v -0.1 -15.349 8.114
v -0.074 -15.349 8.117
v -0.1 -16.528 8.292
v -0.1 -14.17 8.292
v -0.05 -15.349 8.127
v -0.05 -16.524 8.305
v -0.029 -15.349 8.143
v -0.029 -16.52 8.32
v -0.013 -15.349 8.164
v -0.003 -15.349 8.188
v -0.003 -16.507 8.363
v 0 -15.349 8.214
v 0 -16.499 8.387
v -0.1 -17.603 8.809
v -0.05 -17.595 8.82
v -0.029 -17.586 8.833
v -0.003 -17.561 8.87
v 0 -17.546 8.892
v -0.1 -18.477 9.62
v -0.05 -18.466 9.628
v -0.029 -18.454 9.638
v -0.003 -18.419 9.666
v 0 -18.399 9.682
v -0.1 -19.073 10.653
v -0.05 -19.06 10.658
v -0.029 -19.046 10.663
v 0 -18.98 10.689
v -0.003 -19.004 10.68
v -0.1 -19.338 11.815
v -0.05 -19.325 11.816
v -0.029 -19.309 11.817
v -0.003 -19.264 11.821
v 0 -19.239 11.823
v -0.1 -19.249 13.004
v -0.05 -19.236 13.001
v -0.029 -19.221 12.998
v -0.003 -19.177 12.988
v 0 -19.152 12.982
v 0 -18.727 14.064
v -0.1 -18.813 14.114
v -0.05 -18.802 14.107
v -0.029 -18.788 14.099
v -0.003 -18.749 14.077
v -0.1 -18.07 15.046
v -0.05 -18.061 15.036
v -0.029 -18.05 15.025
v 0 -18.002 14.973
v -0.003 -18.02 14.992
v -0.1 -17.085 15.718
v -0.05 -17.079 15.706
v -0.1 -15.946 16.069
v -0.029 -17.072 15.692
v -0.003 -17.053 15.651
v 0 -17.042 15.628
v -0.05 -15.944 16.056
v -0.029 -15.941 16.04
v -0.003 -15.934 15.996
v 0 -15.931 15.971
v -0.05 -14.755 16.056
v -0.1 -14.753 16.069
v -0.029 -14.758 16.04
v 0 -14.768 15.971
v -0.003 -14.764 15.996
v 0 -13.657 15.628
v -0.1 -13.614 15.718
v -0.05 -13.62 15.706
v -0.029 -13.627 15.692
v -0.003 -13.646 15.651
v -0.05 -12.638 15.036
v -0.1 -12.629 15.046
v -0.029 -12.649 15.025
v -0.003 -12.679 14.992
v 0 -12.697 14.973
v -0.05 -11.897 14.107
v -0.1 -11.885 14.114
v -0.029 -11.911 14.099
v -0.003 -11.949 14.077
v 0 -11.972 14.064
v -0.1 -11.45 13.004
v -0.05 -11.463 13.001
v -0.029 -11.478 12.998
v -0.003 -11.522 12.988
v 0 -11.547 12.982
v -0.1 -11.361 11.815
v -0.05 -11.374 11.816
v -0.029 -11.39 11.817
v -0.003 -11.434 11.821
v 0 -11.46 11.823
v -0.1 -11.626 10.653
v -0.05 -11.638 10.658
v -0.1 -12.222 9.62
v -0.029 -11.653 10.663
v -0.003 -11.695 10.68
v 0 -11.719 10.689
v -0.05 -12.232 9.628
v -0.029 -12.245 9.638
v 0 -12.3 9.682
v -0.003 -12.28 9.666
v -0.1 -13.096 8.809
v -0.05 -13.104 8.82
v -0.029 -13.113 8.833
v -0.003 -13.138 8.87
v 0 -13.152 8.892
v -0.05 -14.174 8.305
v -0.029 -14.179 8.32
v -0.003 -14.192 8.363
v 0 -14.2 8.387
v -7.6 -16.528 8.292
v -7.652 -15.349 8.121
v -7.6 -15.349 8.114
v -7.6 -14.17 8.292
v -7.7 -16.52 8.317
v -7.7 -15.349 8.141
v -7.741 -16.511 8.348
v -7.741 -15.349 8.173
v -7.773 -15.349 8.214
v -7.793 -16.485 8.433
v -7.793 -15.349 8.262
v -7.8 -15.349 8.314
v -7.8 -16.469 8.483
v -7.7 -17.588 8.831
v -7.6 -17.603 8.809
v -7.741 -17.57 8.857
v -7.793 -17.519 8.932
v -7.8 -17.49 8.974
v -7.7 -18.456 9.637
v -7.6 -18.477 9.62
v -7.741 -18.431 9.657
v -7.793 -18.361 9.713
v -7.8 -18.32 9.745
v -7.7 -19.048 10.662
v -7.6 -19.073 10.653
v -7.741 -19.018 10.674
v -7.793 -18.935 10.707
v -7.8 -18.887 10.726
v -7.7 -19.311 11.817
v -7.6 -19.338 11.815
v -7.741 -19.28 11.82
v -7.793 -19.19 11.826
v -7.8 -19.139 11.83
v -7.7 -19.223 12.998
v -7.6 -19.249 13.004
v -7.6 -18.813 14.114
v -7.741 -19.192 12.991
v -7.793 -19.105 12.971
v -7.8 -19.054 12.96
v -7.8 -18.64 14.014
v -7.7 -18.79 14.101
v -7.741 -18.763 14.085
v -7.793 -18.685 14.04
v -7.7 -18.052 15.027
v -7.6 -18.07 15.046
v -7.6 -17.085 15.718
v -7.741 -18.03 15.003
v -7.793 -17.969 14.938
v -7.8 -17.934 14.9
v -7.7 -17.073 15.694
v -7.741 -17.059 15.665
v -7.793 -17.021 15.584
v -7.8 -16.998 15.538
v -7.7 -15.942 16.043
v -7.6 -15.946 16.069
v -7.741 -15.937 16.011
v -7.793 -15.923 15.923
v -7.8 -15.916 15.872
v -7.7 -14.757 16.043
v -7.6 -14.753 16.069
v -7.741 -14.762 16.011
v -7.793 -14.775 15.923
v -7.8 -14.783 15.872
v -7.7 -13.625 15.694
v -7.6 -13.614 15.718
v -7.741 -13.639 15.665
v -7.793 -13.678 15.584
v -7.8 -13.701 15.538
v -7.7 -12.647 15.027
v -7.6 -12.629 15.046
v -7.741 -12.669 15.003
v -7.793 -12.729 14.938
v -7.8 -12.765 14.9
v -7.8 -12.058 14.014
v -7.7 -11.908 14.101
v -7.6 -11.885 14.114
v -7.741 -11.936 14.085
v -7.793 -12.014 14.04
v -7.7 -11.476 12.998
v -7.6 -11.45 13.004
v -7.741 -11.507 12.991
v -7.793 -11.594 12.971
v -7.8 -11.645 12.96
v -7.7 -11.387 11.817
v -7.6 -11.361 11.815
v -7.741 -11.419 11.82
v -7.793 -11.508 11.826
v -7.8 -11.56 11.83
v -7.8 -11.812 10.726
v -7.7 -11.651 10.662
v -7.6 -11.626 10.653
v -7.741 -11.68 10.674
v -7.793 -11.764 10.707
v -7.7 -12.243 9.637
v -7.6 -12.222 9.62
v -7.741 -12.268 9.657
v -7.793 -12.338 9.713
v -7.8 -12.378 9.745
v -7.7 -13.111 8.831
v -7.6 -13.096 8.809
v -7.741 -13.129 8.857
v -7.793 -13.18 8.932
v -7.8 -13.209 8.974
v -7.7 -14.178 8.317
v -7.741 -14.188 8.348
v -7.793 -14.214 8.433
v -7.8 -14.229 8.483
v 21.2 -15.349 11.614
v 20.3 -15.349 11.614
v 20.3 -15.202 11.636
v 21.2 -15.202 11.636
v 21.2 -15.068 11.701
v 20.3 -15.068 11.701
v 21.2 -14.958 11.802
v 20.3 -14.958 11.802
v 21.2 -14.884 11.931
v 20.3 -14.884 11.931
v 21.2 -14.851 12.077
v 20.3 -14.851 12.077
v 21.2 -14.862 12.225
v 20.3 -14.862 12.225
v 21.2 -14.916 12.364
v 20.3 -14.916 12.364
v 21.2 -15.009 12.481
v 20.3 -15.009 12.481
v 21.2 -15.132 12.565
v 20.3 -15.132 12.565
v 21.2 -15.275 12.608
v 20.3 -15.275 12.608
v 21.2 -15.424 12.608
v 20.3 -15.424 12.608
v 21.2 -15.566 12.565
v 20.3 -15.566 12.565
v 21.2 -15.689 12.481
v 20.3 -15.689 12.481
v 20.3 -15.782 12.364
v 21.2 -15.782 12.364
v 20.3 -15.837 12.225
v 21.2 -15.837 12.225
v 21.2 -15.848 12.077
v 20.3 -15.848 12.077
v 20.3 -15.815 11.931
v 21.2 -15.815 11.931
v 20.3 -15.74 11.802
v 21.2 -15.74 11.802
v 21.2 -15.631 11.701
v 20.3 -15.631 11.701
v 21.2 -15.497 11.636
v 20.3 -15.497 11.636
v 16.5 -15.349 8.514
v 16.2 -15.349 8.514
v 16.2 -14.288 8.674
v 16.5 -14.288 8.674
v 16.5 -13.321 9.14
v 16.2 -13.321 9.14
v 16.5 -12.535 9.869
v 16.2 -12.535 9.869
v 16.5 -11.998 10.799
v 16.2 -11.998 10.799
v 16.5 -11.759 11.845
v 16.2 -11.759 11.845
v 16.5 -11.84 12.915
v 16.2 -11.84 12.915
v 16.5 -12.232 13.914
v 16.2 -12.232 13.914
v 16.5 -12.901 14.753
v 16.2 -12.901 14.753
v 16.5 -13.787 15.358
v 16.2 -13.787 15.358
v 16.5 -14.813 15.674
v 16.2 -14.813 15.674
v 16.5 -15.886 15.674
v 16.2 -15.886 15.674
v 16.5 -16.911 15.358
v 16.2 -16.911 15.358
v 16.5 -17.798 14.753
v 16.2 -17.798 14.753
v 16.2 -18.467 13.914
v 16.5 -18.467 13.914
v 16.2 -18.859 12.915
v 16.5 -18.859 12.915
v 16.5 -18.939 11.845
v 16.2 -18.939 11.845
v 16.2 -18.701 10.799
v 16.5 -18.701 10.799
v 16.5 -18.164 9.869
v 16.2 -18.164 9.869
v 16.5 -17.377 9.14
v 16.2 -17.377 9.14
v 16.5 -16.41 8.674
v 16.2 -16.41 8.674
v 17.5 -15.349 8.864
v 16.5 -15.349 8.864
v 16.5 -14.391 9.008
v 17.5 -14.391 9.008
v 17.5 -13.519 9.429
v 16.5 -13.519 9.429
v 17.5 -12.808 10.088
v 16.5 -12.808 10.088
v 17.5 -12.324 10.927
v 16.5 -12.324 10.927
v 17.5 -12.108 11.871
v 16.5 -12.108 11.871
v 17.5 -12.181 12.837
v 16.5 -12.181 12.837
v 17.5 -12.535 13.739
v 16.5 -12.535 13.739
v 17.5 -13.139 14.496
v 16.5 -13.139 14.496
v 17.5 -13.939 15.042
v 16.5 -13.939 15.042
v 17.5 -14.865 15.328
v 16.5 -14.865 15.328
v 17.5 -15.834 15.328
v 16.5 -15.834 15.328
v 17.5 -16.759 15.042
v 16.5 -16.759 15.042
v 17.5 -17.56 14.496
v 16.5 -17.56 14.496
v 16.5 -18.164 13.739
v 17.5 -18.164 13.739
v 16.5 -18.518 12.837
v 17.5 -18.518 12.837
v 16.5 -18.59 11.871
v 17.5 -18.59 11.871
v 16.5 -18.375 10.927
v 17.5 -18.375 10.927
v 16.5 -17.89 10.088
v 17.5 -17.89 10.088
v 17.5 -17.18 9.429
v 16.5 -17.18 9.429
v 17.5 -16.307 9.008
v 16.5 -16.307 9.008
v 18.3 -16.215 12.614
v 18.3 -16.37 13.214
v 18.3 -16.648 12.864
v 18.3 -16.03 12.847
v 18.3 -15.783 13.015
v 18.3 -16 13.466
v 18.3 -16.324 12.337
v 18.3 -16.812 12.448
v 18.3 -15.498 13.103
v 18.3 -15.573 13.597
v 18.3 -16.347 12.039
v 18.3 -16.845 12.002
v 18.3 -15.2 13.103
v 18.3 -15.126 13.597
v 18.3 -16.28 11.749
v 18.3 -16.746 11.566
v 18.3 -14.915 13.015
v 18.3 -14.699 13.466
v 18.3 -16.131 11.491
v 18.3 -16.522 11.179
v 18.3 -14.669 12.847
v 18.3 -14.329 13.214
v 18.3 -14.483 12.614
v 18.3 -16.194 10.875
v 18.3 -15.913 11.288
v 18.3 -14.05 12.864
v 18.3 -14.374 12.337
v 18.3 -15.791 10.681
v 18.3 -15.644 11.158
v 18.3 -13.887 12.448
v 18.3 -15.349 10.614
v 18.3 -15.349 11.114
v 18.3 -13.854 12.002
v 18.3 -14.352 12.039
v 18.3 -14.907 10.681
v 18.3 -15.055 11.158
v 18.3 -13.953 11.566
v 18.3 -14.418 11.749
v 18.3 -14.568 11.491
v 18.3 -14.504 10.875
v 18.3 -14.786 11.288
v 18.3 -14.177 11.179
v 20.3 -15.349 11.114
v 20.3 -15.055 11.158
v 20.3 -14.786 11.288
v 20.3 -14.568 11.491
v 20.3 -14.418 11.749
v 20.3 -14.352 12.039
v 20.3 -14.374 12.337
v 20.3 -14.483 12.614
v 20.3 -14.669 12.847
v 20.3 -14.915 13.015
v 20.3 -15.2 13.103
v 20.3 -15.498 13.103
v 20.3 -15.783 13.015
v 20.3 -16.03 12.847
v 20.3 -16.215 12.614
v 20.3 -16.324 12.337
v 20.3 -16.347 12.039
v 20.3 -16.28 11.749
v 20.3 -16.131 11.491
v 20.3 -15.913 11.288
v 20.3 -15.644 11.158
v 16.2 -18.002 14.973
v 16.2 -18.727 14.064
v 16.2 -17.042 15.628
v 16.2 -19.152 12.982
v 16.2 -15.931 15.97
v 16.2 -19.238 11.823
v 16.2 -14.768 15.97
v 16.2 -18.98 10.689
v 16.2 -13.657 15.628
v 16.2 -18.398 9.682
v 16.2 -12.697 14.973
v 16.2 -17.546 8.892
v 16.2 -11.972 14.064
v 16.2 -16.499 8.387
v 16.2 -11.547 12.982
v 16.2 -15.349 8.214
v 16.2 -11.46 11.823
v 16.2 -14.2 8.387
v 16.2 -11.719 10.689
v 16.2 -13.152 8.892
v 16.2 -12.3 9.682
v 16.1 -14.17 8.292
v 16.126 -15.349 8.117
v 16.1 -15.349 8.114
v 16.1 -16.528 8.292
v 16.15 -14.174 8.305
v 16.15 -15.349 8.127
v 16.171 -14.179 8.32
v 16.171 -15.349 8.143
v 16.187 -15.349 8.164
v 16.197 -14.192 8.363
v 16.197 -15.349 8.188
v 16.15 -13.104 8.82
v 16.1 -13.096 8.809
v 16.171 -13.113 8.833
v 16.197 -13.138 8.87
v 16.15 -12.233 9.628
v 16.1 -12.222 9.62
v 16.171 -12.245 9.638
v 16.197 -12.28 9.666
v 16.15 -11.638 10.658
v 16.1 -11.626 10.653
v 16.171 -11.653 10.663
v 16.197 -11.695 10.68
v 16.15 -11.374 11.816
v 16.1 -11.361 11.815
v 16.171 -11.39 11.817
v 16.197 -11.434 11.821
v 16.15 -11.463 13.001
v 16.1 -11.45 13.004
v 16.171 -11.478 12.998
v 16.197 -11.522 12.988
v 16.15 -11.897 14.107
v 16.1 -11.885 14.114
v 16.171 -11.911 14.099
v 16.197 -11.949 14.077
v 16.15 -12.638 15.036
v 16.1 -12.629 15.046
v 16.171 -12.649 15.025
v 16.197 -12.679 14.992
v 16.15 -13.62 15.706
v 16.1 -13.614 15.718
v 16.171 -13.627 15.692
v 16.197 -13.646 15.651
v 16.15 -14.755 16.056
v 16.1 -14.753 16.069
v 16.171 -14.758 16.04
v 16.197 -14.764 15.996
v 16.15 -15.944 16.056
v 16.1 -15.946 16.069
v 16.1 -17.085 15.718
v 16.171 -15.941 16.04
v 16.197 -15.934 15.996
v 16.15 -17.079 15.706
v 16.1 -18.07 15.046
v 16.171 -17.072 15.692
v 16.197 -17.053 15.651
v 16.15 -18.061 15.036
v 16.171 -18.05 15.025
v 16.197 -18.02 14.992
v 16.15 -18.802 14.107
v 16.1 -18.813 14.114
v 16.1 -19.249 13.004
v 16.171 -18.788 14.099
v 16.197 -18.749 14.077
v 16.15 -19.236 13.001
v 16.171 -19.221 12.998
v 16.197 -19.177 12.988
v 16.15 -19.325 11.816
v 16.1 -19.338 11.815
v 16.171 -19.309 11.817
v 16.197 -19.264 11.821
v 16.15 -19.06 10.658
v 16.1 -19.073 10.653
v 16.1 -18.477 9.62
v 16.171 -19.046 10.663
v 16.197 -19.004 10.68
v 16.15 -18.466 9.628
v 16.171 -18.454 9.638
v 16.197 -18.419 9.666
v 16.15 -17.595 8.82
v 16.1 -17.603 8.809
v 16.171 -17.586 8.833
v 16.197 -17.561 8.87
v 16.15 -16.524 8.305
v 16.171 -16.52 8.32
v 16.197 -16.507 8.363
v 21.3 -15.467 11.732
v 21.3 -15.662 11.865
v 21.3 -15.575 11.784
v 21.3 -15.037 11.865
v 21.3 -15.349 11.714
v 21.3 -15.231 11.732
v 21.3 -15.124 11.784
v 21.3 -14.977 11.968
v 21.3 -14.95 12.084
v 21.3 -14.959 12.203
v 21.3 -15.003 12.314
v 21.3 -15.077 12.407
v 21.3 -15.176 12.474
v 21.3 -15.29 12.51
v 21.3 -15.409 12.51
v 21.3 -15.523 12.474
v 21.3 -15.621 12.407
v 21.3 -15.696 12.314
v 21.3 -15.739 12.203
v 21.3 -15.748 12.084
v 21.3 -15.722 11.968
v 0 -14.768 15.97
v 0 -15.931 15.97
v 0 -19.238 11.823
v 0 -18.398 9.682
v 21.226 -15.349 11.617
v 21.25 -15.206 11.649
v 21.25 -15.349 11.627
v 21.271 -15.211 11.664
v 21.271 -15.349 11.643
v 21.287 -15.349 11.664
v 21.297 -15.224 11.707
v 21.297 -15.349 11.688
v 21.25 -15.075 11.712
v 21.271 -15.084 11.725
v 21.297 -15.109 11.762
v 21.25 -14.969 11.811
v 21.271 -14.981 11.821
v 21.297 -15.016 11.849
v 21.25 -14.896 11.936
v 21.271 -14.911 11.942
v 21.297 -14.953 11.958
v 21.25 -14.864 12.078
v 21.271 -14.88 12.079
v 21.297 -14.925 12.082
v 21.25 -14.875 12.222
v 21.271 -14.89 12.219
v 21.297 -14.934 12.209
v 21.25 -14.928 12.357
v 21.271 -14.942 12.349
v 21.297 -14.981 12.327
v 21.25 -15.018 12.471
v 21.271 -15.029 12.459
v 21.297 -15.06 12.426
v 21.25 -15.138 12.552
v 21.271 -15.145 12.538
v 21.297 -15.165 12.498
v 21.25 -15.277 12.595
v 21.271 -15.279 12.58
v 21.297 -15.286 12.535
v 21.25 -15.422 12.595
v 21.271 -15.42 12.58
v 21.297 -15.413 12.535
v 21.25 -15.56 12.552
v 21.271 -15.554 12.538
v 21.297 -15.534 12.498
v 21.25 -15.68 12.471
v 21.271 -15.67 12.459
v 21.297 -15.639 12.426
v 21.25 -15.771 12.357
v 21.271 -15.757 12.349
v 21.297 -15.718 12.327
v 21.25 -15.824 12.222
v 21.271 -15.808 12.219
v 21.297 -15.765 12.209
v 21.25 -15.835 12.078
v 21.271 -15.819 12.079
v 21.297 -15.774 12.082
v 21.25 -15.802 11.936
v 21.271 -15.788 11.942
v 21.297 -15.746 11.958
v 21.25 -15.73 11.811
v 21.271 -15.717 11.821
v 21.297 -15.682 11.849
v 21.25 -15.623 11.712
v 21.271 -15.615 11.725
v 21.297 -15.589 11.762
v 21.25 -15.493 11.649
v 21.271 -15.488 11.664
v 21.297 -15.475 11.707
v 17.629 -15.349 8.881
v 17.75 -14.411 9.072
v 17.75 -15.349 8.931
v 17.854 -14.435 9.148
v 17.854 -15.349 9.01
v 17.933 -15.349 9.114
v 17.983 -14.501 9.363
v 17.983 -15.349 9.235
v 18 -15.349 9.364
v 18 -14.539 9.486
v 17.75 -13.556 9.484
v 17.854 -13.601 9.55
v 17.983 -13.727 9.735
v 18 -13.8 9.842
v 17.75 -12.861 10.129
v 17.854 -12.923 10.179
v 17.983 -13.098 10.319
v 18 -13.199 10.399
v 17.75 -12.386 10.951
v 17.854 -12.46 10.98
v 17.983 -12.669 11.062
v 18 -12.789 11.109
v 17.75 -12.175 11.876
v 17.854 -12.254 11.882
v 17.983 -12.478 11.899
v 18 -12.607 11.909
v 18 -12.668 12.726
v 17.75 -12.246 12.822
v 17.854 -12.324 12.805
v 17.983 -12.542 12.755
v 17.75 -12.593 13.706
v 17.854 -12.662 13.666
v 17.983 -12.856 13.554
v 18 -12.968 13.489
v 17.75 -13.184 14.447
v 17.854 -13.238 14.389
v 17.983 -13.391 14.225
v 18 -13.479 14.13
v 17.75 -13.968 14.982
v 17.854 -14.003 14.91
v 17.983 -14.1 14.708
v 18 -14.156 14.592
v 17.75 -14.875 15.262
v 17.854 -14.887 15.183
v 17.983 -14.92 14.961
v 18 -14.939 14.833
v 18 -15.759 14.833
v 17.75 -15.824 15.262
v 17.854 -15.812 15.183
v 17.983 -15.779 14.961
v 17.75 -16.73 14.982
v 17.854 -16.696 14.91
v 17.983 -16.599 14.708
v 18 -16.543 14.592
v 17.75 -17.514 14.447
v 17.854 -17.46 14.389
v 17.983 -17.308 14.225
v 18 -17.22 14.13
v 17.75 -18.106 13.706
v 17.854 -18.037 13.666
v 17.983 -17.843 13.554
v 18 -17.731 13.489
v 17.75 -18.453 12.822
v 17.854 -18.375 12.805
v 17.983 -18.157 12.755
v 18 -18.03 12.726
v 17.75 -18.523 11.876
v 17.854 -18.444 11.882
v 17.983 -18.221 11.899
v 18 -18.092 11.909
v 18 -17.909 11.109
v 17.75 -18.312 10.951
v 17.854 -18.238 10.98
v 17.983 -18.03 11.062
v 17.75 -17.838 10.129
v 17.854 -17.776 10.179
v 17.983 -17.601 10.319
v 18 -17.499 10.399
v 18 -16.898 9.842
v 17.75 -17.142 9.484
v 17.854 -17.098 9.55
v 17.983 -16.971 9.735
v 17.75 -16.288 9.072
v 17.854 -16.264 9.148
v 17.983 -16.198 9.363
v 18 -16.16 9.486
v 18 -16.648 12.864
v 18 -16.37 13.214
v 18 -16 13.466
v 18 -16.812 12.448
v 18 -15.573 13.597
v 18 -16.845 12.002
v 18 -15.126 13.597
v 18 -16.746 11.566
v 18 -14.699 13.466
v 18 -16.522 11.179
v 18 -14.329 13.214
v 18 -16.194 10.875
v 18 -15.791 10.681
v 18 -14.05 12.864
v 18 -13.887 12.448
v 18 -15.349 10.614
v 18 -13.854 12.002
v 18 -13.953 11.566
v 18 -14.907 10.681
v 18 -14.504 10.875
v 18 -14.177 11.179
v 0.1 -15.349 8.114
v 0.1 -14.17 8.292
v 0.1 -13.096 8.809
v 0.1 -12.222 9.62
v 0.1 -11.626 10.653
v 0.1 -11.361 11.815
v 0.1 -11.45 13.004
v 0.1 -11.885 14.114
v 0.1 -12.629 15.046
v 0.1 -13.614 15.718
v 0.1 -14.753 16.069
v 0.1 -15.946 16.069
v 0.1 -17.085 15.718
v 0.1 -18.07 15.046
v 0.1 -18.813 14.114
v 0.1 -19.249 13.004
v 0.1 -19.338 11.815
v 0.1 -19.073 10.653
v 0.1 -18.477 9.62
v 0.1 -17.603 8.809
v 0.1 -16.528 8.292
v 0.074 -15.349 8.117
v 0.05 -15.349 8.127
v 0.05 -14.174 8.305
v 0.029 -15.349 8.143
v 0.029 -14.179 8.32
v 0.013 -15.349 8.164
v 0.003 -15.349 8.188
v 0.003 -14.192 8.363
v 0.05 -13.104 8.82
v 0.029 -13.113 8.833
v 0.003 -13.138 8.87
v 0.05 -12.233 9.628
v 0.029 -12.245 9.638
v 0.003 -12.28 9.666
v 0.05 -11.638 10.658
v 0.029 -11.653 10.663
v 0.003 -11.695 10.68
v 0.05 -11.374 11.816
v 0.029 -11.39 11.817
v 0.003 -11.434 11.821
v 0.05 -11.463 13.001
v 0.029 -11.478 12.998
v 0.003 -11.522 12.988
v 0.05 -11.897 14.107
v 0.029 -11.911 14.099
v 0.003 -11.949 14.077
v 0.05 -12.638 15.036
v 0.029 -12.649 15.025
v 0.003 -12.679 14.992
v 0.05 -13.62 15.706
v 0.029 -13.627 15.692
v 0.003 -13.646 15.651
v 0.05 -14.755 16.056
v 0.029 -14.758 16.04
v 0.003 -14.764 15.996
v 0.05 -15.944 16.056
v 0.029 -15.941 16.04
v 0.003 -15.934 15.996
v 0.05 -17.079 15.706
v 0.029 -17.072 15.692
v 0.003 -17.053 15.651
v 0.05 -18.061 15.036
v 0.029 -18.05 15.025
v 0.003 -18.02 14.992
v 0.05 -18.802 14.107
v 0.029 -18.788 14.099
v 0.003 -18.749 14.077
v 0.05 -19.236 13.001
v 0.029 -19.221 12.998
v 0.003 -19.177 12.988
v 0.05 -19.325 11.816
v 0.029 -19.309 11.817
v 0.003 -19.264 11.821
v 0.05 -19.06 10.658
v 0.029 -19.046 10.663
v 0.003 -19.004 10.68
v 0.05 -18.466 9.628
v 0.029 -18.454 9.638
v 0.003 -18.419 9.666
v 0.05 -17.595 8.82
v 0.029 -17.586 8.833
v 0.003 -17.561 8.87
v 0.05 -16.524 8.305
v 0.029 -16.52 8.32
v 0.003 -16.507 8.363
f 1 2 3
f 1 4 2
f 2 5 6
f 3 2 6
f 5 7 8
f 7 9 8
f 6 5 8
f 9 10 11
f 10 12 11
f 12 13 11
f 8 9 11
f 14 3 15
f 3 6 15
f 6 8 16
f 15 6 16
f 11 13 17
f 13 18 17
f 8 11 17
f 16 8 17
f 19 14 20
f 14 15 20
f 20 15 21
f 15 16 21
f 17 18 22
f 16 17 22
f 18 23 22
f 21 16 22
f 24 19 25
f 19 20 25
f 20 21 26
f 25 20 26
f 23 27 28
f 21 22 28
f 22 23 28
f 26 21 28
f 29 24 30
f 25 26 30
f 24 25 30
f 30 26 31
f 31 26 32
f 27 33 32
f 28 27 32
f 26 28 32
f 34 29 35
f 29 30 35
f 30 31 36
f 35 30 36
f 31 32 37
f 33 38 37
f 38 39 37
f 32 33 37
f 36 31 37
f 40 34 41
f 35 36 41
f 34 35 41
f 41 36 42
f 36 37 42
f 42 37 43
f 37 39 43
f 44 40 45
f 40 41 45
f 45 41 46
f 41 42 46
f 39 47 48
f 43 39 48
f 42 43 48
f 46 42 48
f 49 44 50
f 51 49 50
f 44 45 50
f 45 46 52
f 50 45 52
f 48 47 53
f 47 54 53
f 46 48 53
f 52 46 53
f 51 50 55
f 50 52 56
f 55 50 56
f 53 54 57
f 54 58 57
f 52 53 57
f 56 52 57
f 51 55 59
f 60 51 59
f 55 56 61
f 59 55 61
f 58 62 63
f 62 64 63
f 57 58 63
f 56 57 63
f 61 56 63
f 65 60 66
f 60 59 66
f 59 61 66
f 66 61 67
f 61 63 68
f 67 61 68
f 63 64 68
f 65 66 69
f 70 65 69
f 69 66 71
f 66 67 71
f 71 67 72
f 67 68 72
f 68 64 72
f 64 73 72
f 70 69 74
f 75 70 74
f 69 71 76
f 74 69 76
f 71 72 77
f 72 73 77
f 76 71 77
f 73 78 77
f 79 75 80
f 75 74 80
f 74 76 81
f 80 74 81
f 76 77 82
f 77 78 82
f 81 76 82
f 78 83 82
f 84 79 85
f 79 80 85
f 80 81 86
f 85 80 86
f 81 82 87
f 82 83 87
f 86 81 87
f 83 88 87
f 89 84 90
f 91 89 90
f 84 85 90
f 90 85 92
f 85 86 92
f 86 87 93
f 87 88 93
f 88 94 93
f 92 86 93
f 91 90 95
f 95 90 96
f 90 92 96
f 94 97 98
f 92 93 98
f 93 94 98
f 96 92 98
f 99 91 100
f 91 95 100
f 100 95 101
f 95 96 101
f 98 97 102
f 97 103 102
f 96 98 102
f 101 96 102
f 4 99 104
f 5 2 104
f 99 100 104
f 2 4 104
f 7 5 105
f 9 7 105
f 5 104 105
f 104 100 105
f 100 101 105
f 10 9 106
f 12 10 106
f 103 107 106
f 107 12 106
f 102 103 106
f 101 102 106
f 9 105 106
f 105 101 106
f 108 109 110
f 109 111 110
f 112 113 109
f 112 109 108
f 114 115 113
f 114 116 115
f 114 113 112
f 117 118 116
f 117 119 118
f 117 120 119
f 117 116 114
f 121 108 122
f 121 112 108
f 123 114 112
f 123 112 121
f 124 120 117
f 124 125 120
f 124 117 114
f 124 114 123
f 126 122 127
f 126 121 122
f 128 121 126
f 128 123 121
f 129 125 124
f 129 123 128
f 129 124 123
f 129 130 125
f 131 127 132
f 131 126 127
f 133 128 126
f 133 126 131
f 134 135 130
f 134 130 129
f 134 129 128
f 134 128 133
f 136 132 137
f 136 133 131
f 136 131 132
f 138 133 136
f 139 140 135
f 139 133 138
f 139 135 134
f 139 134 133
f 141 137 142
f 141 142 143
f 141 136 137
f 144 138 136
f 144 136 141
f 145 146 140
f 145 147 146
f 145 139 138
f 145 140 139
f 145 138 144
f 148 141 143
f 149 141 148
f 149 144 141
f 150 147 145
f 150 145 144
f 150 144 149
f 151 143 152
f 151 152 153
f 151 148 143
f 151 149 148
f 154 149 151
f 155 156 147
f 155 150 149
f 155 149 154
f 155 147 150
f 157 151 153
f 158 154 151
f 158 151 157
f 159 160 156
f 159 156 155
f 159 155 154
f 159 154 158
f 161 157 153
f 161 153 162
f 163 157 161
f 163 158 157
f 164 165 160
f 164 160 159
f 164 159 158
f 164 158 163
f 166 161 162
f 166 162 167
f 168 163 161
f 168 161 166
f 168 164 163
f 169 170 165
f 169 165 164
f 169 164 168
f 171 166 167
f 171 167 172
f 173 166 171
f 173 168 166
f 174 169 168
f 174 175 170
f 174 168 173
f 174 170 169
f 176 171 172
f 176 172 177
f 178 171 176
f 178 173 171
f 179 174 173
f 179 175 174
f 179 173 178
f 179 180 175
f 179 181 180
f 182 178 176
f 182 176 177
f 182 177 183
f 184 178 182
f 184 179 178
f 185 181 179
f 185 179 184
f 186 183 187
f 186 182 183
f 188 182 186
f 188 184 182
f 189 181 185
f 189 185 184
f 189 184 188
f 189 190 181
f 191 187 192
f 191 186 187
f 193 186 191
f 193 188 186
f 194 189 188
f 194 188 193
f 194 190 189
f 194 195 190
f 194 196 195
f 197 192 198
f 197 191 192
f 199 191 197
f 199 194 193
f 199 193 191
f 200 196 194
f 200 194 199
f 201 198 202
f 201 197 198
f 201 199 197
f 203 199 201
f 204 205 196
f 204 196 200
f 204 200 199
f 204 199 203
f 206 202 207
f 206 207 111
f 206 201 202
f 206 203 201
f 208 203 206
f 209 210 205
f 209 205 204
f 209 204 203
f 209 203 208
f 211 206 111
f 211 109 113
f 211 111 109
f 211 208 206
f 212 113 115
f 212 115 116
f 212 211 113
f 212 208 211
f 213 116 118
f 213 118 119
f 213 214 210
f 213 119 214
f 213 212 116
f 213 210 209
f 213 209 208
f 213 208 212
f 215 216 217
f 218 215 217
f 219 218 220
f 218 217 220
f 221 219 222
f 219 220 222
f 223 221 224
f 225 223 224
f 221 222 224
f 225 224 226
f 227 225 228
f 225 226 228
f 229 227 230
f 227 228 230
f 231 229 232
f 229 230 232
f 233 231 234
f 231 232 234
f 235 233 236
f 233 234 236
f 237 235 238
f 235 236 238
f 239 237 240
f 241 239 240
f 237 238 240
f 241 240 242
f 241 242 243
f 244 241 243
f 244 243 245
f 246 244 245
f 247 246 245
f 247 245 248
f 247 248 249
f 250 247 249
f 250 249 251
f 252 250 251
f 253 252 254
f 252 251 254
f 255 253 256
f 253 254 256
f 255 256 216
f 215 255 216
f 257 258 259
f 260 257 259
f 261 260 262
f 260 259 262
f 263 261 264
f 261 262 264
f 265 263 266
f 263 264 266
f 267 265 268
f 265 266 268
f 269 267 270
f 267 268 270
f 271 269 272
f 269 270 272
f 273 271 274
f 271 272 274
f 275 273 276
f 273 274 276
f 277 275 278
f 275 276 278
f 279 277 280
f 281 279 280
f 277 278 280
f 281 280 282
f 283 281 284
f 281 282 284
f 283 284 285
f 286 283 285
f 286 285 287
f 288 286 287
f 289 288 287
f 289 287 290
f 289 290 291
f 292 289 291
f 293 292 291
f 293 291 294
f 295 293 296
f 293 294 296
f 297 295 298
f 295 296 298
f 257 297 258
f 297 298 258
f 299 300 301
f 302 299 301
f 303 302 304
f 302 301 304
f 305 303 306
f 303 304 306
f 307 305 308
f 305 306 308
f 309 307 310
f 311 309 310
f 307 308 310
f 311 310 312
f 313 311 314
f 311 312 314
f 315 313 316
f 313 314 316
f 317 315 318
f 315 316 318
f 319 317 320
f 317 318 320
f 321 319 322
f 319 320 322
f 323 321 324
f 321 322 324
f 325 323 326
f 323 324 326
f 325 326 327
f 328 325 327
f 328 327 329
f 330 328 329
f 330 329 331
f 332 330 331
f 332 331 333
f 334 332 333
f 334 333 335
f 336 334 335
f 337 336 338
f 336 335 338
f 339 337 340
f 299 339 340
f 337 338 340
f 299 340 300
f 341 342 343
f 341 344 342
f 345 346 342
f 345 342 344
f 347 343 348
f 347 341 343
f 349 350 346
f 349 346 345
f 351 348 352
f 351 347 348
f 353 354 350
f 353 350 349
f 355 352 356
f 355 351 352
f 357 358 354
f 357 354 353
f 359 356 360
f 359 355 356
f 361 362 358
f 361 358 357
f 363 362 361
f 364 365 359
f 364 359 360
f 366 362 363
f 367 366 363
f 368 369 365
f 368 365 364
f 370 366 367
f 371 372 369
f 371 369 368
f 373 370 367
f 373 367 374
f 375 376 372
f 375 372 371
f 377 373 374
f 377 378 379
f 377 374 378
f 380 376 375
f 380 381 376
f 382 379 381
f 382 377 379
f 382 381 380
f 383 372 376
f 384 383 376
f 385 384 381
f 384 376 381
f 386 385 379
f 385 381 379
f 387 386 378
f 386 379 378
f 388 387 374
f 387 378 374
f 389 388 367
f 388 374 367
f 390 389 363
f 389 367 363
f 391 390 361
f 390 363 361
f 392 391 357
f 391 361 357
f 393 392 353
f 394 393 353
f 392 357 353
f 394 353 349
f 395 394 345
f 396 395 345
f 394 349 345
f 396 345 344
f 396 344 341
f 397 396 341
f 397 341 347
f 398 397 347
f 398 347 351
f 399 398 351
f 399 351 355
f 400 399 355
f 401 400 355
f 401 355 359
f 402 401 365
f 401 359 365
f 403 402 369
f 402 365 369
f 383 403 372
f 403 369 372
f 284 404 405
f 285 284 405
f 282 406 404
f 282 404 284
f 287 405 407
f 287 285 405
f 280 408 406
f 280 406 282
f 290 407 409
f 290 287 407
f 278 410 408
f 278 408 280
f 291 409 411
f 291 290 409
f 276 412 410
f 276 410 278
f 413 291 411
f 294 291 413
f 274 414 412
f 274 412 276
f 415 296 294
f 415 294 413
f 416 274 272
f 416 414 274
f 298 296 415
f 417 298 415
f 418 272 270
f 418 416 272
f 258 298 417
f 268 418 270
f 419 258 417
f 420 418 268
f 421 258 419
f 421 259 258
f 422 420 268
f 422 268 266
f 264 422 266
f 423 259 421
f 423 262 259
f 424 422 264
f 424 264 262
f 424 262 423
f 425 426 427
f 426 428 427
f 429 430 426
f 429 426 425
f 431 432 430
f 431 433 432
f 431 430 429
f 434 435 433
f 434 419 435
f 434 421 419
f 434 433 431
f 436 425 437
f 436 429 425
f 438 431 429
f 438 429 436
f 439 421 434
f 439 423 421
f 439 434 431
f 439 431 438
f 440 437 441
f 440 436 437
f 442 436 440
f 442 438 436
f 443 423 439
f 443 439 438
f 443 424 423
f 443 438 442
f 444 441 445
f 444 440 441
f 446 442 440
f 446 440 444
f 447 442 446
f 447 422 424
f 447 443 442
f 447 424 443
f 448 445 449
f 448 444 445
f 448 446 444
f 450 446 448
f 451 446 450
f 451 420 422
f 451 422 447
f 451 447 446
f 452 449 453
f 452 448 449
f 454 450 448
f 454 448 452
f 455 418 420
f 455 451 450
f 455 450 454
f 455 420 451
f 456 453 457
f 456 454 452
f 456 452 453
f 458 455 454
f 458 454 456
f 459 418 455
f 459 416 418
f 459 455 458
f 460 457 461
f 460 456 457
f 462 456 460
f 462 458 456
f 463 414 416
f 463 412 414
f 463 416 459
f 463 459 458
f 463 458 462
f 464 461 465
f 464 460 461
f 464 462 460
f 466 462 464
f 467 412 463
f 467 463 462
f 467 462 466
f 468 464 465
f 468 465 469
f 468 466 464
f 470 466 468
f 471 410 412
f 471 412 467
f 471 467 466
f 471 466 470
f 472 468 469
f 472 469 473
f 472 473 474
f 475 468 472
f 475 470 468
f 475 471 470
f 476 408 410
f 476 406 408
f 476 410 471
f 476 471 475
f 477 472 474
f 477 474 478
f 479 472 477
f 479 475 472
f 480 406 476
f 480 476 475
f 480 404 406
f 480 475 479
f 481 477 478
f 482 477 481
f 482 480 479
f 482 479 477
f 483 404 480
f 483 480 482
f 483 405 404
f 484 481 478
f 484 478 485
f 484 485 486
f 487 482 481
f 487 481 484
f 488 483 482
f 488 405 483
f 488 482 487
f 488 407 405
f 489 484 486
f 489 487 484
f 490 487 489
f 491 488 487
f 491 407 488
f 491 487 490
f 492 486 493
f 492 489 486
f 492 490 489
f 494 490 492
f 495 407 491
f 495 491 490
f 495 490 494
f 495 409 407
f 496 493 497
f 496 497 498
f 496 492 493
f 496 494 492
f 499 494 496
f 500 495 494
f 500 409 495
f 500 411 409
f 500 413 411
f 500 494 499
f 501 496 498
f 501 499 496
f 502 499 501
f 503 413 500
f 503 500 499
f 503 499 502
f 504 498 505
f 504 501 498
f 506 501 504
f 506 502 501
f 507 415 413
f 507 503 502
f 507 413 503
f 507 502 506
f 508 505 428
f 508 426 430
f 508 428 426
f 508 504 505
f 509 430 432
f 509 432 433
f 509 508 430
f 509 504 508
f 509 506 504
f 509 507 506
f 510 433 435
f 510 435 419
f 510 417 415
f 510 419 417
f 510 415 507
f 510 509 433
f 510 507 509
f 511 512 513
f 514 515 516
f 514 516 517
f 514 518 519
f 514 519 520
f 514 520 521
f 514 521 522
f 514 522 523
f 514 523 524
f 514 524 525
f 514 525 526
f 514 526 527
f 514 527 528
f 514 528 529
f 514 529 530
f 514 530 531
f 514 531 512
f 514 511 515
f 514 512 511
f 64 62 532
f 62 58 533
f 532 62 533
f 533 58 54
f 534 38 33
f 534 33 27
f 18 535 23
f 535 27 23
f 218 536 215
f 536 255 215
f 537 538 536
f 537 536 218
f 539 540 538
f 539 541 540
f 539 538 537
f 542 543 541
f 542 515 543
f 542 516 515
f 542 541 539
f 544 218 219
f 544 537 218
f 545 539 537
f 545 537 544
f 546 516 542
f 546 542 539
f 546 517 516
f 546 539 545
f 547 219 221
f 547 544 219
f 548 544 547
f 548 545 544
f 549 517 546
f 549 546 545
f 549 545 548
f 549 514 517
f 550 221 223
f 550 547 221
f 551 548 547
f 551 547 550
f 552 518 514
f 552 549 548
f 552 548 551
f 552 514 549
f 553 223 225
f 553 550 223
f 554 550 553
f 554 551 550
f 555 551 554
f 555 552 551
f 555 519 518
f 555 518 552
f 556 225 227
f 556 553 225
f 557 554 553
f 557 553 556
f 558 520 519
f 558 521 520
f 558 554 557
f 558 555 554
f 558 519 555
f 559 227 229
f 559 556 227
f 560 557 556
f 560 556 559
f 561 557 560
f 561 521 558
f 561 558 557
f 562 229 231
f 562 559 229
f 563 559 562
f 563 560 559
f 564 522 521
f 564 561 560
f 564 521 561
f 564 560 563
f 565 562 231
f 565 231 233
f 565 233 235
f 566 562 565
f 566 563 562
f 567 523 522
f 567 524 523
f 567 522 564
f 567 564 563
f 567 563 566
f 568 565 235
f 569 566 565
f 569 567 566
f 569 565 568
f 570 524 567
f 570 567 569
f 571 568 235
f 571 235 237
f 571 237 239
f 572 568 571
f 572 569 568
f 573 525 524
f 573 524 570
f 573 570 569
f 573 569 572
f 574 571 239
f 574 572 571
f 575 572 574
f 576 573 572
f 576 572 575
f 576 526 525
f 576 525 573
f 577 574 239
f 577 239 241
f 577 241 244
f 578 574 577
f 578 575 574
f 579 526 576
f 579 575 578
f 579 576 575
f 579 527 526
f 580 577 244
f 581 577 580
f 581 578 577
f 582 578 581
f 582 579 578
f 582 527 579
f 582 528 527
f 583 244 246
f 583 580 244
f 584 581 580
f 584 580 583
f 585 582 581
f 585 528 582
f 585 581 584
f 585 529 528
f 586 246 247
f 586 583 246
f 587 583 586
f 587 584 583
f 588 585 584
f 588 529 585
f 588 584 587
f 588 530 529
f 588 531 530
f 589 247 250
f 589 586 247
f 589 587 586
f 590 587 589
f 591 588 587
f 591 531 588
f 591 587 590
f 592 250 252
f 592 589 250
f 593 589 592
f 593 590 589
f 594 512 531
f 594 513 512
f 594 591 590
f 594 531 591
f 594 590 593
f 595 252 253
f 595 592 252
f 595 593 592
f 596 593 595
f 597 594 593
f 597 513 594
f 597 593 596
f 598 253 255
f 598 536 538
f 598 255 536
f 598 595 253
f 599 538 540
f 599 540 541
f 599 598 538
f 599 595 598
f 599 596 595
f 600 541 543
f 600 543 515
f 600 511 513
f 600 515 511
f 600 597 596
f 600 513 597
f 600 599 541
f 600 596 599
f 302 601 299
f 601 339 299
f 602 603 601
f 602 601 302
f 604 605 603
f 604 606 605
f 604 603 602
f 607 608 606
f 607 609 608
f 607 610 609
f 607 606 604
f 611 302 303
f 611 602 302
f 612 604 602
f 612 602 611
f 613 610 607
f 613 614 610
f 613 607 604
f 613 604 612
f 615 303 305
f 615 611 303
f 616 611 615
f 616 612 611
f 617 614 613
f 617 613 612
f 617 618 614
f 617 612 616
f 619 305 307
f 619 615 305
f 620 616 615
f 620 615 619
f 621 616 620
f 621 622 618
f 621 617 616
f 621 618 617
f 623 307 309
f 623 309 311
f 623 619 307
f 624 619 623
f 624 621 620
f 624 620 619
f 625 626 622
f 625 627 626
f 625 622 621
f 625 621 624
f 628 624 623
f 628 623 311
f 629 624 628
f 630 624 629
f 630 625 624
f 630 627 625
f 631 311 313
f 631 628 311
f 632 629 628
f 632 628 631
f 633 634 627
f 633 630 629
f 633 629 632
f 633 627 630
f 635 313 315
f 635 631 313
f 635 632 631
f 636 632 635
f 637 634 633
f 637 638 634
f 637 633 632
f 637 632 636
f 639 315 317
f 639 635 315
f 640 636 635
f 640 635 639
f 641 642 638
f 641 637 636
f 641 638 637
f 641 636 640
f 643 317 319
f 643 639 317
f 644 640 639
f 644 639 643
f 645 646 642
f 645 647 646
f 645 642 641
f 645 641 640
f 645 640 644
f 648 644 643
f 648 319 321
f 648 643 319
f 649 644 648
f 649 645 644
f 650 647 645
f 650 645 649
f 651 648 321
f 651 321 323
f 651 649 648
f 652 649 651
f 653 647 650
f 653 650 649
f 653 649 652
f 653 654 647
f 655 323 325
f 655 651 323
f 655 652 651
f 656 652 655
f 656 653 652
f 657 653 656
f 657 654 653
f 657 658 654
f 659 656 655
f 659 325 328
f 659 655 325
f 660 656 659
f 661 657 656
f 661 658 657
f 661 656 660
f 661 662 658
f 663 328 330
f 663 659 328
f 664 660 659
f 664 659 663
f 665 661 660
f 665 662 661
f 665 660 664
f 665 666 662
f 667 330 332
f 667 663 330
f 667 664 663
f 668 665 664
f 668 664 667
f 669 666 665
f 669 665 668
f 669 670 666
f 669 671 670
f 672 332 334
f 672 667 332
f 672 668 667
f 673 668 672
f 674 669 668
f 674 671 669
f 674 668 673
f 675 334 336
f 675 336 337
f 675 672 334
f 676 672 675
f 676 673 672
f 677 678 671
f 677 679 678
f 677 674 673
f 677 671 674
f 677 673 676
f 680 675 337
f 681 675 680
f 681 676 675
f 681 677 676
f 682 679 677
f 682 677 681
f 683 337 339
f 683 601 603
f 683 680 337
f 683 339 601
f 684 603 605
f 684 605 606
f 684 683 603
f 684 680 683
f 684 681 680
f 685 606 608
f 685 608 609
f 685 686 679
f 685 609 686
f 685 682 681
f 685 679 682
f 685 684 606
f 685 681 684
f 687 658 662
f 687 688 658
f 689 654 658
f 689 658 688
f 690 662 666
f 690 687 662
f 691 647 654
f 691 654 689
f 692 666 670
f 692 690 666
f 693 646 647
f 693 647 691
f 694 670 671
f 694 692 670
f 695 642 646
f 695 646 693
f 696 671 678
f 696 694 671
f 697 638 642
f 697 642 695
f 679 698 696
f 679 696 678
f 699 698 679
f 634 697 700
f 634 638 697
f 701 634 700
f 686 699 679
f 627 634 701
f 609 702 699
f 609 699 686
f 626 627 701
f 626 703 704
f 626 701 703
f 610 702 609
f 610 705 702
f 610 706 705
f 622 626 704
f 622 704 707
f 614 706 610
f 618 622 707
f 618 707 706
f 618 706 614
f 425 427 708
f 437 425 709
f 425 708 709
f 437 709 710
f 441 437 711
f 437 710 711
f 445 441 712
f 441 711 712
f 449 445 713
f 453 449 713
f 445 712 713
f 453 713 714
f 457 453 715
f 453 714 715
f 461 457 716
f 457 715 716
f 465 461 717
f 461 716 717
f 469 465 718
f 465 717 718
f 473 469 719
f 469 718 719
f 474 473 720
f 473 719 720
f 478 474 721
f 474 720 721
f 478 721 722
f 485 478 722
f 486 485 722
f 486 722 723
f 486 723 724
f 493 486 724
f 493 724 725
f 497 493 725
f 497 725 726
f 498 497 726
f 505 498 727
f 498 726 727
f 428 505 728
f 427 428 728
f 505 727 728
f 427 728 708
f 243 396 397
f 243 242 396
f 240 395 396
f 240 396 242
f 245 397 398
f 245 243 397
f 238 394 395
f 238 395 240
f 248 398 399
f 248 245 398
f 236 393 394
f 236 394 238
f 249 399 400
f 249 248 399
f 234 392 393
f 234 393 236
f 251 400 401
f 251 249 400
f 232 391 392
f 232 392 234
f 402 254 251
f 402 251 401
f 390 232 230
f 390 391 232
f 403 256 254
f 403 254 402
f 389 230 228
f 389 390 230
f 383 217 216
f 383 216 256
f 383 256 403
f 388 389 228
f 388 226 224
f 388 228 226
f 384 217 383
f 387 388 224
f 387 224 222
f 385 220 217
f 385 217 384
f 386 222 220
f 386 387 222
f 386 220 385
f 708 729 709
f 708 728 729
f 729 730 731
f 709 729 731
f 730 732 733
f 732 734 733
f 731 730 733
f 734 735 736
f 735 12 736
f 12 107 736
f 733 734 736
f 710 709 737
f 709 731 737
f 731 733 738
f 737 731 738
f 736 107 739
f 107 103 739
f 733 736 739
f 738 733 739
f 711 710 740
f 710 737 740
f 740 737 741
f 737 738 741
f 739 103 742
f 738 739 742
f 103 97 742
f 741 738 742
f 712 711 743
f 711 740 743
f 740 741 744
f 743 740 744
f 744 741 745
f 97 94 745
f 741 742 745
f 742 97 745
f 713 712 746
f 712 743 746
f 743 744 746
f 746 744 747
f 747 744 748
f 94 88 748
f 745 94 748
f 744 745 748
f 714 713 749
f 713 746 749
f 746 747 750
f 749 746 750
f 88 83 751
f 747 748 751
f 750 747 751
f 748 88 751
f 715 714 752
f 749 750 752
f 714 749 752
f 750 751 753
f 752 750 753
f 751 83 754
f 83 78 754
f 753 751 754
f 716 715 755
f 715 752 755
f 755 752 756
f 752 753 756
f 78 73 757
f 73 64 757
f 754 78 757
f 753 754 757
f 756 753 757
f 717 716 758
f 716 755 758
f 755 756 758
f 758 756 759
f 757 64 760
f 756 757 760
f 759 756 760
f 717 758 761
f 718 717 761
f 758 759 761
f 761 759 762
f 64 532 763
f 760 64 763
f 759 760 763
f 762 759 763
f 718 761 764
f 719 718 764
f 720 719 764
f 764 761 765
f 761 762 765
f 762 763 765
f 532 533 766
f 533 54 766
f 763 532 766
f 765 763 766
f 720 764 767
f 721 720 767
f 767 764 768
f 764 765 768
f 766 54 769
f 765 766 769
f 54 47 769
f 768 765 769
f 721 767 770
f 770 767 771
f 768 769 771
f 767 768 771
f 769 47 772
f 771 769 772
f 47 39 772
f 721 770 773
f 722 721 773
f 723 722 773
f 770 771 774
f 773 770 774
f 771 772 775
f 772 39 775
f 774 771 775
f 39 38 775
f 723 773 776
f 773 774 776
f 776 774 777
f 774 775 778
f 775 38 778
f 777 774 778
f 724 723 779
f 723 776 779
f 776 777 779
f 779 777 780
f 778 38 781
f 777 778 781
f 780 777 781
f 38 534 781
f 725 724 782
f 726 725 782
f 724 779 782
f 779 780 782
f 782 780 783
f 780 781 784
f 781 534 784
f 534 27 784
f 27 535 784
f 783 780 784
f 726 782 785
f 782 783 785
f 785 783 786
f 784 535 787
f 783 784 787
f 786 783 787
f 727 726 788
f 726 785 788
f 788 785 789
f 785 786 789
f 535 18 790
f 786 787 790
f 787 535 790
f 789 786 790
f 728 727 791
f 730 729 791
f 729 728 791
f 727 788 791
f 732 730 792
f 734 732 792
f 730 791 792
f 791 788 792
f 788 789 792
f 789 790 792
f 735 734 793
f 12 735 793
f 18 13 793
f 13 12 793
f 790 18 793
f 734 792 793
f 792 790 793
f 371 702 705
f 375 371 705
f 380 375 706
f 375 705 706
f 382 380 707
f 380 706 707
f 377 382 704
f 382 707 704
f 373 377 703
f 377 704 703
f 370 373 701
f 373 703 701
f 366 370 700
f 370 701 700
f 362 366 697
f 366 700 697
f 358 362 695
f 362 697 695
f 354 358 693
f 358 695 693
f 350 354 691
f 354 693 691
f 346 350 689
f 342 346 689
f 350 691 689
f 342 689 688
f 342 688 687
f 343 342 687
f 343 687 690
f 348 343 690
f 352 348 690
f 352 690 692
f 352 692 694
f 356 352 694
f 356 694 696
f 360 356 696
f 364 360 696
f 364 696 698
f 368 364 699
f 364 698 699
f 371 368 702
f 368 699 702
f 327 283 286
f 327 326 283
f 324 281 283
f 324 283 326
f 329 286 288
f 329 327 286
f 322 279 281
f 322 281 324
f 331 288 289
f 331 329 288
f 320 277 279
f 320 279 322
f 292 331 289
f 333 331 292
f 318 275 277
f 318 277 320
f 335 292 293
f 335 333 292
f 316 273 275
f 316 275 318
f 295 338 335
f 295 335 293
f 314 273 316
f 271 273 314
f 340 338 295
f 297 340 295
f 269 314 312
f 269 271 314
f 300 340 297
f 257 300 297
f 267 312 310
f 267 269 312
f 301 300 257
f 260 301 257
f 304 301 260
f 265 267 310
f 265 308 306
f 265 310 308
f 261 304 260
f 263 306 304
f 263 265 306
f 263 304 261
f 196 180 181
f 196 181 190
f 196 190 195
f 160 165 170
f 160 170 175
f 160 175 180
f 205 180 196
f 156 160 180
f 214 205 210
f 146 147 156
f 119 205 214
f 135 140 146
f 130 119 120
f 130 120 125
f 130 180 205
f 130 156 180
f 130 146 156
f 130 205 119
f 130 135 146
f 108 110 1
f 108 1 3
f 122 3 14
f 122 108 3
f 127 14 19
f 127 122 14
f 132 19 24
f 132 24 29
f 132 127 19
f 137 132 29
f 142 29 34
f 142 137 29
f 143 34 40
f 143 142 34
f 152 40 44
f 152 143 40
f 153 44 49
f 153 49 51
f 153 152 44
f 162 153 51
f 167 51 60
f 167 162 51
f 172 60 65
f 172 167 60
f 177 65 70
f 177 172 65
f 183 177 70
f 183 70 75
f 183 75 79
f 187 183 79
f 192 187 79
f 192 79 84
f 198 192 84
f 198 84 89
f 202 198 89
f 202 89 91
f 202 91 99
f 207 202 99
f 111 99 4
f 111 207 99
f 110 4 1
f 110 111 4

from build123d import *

# Parameters (mm, degrees)
SKETCH1_R           = 4
BOSS_EXTRUDE1_DEPTH = 16.2
SKETCH2_R           = 3.6
BOSS_EXTRUDE2_DEPTH = 0.3
SKETCH3_R           = 3.25
BOSS_EXTRUDE3_DEPTH = 1.5
FILLET1_R           = 0.5
SKETCH4_R           = 1.5
BOSS_EXTRUDE4_DEPTH = 0.3
SKETCH5_R           = 1
BOSS_EXTRUDE5_DEPTH = 2
SKETCH6_R           = 0.5
BOSS_EXTRUDE6_DEPTH = 1
FILLET2_R           = 0.1
FILLET3_R           = 0.1
BOSS_EXTRUDE7_START = 7.8
SKETCH7_R           = 4
BOSS_EXTRUDE7_DEPTH = 7.8
FILLET4_R           = 0.2
FILLET5_R           = 0.1
FILLET6_R           = 0.1


with BuildPart() as part:
    # Sketch1 → Boss-Extrude1 (new body)
    with BuildSketch(Plane(origin=(0, 0, 0), x_dir=(0, 0, -1), z_dir=(1, 0, 0))):
        with Locations((-12.114049009, -15.349356514)):
            Circle(SKETCH1_R)
    extrude(amount=BOSS_EXTRUDE1_DEPTH)

    # Sketch2 → Boss-Extrude2 (add)
    with BuildSketch(Plane(origin=(16.2, 0, 0), x_dir=(0, 0, -1), z_dir=(1, 0, 0))):
        with Locations((-12.114049009, -15.349356514)):
            Circle(SKETCH2_R)
    extrude(amount=BOSS_EXTRUDE2_DEPTH)

    # Sketch3 → Boss-Extrude3 (add)
    with BuildSketch(Plane(origin=(16.5, 0, 0), x_dir=(0, 0, -1), z_dir=(1, 0, 0))):
        with Locations((-12.114049009, -15.349356514)):
            Circle(SKETCH3_R)
    extrude(amount=BOSS_EXTRUDE3_DEPTH)

    # Fillet1
    fillet1_edges = [part.edges().sort_by_distance(p)[0] for p in [
        (18, -15.349356514, 15.364049009),
    ]]
    fillet(fillet1_edges, radius=FILLET1_R)

    # Sketch4 → Boss-Extrude4 (add)
    with BuildSketch(Plane(origin=(18, 0, 0), x_dir=(0, 0, -1), z_dir=(1, 0, 0))):
        with Locations((-12.114049009, -15.349356514)):
            Circle(SKETCH4_R)
    extrude(amount=BOSS_EXTRUDE4_DEPTH)

    # Sketch5 → Boss-Extrude5 (add)
    with BuildSketch(Plane(origin=(18.3, 0, 0), x_dir=(0, 0, -1), z_dir=(1, 0, 0))):
        with Locations((-12.114049009, -15.349356514)):
            Circle(SKETCH5_R)
    extrude(amount=BOSS_EXTRUDE5_DEPTH)

    # Sketch6 → Boss-Extrude6 (add)
    with BuildSketch(Plane(origin=(20.3, 0, 0), x_dir=(0, 0, -1), z_dir=(1, 0, 0))):
        with Locations((-12.114049009, -15.349356514)):
            Circle(SKETCH6_R)
    extrude(amount=BOSS_EXTRUDE6_DEPTH)

    # Fillet2
    fillet2_edges = [part.edges().sort_by_distance(p)[0] for p in [
        (0, -15.349356514, 16.114049009),
    ]]
    fillet(fillet2_edges, radius=FILLET2_R)

    # Fillet3
    fillet3_edges = [part.edges().sort_by_distance(p)[0] for p in [
        (16.2, -15.349356514, 16.114049009),
    ]]
    fillet(fillet3_edges, radius=FILLET3_R)

    # Sketch7 → Boss-Extrude7 (add)
    with BuildSketch(Plane.ZY.offset(BOSS_EXTRUDE7_START)):
        with Locations(Location((12.114049009, -15.349356514, 0), (0, 0, 180))):
            Circle(SKETCH7_R)
    extrude(amount=-BOSS_EXTRUDE7_DEPTH)

    # Fillet4
    fillet4_edges = [part.edges().sort_by_distance(p)[0] for p in [
        (-7.8, -15.349356514, 16.114049009),
    ]]
    fillet(fillet4_edges, radius=FILLET4_R)

    # Fillet5
    fillet5_edges = [part.edges().sort_by_distance(p)[0] for p in [
        (0, -15.349356514, 16.114049009),
    ]]
    fillet(fillet5_edges, radius=FILLET5_R - 0.0001)  # a hair under: the kernel refuses the full size

    # Fillet6
    fillet6_edges = [part.edges().sort_by_distance(p)[0] for p in [
        (21.3, -15.349356514, 12.614049009),
    ]]
    fillet(fillet6_edges, radius=FILLET6_R)


solid = part.part
